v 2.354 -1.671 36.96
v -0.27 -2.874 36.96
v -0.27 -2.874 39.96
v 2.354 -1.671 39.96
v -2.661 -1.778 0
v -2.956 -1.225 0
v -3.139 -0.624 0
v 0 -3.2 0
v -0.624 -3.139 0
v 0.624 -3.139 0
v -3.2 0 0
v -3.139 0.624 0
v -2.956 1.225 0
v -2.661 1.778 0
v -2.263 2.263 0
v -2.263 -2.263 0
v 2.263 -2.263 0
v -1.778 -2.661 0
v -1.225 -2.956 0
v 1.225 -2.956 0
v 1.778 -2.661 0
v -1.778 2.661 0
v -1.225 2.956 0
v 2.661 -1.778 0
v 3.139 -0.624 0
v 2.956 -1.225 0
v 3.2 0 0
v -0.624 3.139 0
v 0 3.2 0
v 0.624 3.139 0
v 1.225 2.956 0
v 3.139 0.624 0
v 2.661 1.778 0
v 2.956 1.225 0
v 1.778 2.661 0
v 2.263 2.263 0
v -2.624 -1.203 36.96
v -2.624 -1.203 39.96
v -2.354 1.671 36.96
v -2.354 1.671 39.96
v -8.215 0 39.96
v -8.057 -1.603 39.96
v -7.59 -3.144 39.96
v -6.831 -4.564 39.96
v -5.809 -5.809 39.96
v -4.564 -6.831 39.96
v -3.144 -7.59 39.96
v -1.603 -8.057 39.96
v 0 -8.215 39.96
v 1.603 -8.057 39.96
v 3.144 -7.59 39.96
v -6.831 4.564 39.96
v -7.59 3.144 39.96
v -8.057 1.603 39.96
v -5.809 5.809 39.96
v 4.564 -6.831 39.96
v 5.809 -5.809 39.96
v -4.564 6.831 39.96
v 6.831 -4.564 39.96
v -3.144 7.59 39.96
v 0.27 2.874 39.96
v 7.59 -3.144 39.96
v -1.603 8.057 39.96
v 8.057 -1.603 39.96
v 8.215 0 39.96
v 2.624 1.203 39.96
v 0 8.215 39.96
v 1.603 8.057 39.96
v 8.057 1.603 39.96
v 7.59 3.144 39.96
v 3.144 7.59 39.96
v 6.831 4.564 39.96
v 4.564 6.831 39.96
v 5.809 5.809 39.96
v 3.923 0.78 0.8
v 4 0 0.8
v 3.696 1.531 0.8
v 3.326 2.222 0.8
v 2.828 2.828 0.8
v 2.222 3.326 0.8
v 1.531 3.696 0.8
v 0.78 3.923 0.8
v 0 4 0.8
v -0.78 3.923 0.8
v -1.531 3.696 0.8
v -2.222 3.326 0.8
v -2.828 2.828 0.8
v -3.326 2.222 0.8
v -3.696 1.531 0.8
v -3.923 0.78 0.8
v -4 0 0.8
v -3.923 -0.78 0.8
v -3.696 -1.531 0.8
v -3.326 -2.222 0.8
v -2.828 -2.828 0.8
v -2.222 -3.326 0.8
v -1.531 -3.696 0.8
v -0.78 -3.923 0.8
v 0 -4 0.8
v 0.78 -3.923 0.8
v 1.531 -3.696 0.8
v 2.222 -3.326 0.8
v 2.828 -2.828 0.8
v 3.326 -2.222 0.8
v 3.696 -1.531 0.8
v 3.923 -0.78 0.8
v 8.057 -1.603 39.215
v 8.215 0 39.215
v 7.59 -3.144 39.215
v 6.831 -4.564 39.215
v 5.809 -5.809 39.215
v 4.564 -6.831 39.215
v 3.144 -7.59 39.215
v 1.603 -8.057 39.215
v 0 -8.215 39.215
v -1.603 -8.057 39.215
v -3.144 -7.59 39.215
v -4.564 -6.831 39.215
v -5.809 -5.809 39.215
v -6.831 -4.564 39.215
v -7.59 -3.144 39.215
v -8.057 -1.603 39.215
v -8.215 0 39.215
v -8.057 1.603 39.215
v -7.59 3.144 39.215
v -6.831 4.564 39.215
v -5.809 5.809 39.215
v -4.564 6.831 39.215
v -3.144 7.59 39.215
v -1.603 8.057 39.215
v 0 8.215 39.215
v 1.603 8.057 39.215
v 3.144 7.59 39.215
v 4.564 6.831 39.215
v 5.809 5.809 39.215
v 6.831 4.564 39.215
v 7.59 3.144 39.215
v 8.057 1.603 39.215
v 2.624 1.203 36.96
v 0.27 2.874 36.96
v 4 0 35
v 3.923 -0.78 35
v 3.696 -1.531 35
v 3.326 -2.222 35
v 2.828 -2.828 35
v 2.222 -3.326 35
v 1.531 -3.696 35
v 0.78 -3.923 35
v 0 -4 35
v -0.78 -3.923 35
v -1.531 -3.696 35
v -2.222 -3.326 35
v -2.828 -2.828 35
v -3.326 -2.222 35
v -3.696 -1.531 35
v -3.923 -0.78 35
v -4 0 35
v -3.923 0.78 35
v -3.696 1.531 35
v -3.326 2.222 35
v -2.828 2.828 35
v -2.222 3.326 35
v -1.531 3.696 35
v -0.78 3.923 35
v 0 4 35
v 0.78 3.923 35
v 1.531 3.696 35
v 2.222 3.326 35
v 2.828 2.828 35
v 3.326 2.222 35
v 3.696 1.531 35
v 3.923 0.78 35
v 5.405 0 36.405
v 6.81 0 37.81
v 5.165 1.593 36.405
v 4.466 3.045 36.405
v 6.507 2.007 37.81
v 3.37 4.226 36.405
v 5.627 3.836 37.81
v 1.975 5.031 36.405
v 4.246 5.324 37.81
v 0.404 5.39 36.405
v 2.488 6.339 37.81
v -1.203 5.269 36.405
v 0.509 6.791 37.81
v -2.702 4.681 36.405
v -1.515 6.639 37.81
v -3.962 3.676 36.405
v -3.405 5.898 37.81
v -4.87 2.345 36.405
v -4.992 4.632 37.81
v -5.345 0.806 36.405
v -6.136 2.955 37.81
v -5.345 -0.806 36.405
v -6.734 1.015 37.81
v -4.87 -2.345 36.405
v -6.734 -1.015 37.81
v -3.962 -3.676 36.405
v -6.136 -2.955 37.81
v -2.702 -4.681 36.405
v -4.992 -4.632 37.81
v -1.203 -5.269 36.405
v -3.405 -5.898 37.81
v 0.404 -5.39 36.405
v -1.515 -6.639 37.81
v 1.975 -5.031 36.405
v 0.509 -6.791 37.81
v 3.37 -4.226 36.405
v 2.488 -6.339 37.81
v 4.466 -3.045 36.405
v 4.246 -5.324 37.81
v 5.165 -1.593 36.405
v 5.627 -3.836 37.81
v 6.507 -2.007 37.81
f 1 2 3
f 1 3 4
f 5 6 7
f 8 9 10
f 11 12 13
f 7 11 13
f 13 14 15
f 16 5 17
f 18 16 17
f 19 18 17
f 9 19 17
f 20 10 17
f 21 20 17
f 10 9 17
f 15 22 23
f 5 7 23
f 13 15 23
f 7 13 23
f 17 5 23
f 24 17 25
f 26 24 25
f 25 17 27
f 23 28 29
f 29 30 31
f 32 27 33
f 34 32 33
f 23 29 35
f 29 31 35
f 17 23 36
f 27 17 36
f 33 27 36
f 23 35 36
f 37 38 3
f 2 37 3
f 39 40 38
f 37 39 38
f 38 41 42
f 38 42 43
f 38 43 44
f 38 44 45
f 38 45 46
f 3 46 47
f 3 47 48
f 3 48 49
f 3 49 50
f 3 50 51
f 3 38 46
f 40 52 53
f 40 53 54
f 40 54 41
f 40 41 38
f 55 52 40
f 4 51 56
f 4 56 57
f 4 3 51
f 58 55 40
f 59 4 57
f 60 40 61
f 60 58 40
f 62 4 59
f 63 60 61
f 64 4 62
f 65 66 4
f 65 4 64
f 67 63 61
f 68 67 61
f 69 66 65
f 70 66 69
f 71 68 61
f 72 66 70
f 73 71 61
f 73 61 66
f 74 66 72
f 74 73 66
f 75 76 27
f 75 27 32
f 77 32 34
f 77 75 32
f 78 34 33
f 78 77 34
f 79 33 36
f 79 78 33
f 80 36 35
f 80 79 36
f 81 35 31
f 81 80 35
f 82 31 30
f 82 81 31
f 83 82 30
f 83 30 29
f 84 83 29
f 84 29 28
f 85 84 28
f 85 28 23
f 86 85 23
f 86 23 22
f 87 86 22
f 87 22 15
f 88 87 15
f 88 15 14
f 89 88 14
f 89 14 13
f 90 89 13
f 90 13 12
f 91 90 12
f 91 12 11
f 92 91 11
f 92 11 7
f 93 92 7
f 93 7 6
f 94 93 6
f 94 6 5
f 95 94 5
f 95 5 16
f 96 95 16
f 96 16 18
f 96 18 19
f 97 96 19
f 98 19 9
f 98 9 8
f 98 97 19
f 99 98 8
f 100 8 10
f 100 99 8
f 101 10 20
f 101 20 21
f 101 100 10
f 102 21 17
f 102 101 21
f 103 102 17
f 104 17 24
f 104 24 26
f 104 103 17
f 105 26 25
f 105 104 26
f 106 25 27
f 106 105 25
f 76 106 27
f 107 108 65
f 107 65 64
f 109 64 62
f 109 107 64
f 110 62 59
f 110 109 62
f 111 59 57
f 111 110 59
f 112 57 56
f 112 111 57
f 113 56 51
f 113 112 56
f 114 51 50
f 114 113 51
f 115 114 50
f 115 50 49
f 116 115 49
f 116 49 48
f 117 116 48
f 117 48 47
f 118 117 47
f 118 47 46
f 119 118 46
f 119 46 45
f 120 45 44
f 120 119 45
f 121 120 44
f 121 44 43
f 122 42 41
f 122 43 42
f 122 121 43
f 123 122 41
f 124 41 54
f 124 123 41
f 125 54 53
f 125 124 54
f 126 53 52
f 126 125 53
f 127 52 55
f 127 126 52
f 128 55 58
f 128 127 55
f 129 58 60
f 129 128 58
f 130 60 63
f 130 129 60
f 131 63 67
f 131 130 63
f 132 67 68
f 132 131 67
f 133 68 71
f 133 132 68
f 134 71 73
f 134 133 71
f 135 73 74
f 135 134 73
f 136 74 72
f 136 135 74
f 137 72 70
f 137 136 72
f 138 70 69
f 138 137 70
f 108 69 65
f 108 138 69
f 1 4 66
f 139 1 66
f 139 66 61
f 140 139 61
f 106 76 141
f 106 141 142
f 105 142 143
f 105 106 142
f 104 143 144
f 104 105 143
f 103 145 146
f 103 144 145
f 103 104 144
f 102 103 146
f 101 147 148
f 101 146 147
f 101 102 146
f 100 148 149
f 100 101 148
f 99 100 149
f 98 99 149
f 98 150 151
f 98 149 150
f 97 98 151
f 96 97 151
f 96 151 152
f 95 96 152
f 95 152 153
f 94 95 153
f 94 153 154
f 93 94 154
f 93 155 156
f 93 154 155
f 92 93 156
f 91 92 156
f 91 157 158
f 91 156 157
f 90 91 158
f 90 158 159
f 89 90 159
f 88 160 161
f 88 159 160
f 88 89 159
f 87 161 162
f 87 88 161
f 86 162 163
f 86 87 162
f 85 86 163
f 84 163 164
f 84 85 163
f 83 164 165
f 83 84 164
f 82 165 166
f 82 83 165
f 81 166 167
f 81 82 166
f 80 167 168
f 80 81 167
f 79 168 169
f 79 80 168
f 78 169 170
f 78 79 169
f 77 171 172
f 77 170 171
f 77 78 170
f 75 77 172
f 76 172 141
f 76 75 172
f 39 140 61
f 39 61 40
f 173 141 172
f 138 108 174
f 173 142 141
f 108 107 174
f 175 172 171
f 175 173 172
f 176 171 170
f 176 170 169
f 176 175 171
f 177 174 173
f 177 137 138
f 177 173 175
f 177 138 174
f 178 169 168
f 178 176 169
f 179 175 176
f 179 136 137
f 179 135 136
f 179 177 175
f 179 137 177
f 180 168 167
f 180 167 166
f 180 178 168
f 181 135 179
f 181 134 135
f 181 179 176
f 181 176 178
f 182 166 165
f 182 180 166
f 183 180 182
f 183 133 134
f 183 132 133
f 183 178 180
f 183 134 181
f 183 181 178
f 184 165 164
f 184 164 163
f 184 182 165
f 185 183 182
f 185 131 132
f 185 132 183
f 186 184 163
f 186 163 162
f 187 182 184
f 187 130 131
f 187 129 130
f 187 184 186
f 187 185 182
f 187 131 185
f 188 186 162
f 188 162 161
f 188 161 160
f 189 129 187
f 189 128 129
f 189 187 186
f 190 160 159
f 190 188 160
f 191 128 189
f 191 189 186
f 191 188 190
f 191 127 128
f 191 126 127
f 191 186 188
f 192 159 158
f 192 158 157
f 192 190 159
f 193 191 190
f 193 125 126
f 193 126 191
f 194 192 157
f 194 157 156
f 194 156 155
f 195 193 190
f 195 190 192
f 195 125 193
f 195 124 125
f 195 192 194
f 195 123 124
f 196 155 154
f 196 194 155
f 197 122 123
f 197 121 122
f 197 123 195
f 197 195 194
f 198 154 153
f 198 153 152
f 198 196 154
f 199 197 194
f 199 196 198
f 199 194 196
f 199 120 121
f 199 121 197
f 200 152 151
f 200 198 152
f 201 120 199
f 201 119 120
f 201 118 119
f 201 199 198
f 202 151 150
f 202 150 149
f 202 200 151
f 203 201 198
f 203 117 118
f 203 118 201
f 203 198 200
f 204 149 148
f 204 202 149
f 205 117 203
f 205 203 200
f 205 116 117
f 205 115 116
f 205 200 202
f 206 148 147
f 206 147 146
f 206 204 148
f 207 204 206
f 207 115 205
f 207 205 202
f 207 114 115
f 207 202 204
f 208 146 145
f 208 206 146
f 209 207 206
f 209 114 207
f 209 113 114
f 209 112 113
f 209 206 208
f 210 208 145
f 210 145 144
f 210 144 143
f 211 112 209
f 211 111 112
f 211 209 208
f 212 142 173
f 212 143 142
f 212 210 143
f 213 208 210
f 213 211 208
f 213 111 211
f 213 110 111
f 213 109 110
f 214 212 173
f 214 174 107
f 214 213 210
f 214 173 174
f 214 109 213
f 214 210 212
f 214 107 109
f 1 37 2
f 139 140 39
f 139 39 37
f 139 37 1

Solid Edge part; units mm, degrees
sketch "Sketch1" plane through (0, 0, 0) normal (0, -1, 0) x (1, 0, 0)
  line L0 (4, 35) -> (4, 0)
  line L1 (4, 0) -> (0, 0)
  line L2 (0, 0) -> (0, 39.96)
  line L3 (0, 39.96) -> (8.215, 39.96)
  line L4 (8.215, 39.96) -> (8.215, 39.215)
  line L5 (4, 35) -> (8.215, 39.215)
revolve "RevolvedProtrusion1" add sketch "Sketch1" angle 360 about axis through (0, 0, 0) along (0, 0, 1)
sketch "Sketch2" plane through (0, 0, 39.96) normal (0, 0, 1) x (0, 1, 0)
  line L0 (1.2028, -2.6242) -> (2.8741, -0.2704)
  line L1 (2.8741, -0.2704) -> (1.6712, 2.3538)
  line L2 (1.6712, 2.3538) -> (-1.2028, 2.6242)
  line L3 (-1.2028, 2.6242) -> (-2.8741, 0.2704)
  line L4 (-2.8741, 0.2704) -> (-1.6712, -2.3538)
  line L5 (-1.6712, -2.3538) -> (1.2028, -2.6242)
extrude "Cutout1" cut sketch "Sketch2" against normal blind 3
cosmetic_thread "Thread1" size "M8"
chamfer "Chamfer1" distance 0.8 angle 45 1 edges at (-4, 0, 0)
properties material "Stainless steel"
